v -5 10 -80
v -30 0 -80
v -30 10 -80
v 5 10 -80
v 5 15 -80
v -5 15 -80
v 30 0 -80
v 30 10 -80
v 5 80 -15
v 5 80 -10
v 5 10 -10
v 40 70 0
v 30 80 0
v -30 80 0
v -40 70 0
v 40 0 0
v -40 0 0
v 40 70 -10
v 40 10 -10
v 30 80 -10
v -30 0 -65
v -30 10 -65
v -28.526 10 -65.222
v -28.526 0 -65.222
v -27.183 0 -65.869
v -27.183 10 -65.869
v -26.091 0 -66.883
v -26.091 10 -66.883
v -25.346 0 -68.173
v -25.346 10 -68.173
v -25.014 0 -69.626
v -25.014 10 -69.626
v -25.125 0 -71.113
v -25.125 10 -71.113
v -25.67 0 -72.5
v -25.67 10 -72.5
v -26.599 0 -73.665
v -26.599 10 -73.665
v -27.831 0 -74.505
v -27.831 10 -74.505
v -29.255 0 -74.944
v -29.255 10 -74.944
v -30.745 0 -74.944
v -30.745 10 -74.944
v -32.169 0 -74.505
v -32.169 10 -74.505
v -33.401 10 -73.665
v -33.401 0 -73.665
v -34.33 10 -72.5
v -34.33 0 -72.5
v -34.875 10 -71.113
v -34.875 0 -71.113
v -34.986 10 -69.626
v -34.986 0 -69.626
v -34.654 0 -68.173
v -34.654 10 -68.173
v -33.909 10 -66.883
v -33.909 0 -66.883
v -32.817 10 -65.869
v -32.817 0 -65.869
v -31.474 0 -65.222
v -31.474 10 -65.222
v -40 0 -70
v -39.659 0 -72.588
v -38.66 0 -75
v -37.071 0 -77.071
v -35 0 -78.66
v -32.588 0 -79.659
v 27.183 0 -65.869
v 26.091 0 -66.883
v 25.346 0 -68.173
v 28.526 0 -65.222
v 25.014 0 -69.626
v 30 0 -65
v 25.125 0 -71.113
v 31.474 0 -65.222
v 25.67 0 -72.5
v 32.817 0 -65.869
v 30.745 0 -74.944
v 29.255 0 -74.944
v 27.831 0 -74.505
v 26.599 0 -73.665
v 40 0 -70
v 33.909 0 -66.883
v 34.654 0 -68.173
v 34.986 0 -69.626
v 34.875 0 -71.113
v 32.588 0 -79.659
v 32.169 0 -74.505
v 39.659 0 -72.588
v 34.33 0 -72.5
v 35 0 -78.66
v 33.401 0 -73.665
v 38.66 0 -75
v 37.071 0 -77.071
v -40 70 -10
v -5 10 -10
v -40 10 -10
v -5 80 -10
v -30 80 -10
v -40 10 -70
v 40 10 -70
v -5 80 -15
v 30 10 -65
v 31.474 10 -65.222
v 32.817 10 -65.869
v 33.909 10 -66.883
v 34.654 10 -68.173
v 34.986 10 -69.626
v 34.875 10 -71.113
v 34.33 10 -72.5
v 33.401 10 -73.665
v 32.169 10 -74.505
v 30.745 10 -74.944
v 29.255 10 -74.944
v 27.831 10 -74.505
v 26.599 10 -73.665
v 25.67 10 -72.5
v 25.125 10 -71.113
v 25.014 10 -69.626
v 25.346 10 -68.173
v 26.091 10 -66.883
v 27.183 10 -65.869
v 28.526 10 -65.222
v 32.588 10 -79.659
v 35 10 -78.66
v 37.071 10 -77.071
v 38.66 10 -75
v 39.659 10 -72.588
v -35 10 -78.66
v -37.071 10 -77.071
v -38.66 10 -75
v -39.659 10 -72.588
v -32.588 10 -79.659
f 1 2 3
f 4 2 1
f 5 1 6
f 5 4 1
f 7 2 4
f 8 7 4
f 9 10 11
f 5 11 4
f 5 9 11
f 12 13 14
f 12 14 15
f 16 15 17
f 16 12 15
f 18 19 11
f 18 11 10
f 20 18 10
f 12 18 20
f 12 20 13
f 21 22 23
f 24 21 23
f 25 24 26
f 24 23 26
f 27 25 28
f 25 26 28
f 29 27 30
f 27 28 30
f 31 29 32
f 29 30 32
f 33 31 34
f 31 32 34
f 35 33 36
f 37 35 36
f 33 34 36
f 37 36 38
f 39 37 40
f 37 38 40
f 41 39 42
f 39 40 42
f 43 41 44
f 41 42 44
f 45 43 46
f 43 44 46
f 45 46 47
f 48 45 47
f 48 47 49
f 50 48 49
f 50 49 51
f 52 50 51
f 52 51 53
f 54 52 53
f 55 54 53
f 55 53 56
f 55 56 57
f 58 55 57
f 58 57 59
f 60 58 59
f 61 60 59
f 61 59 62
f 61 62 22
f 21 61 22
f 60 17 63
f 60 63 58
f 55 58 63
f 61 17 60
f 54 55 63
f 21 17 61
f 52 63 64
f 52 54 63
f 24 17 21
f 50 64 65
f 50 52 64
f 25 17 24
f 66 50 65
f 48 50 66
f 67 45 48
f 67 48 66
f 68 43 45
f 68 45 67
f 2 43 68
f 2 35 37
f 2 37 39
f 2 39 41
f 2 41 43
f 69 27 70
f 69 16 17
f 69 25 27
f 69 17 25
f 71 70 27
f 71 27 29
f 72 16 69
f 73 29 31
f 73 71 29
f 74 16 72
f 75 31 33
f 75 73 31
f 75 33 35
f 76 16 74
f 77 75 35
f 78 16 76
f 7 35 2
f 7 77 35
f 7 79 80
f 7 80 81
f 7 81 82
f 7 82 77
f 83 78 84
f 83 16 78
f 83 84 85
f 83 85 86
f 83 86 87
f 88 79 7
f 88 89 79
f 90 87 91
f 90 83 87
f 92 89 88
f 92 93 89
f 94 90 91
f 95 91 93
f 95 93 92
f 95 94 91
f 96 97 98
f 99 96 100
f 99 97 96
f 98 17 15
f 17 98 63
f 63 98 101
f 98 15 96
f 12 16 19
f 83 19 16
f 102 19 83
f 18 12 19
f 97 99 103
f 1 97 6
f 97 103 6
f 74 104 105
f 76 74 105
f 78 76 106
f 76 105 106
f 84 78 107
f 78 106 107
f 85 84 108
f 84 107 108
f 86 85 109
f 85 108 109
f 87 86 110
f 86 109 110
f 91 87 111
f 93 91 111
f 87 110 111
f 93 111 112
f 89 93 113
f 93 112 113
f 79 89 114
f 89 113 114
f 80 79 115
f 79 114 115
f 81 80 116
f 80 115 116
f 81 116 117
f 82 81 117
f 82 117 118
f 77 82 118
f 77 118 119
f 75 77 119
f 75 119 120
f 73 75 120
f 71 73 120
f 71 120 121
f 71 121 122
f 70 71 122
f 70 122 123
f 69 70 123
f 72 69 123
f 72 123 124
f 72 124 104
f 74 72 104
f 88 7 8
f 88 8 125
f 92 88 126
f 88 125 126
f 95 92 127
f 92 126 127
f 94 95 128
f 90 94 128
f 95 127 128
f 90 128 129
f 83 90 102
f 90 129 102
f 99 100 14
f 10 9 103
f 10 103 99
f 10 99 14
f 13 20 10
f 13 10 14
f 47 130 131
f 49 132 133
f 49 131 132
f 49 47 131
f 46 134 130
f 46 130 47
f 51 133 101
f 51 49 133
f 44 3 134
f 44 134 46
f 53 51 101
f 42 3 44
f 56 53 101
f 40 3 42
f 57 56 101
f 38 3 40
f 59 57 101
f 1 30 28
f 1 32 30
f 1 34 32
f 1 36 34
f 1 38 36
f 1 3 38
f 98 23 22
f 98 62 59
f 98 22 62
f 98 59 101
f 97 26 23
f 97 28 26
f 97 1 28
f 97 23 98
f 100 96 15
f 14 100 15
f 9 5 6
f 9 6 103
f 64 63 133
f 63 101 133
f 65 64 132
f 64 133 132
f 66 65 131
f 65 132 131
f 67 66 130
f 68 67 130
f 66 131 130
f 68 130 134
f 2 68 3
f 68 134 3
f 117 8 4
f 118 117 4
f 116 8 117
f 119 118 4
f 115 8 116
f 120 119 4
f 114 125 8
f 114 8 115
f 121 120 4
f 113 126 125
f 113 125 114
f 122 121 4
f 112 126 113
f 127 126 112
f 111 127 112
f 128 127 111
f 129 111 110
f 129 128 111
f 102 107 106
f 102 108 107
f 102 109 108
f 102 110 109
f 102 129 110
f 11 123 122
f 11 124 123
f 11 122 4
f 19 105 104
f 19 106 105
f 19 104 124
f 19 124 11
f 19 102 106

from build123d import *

# Parameters (mm, degrees)
BOSS_EXTRUDE2_DEPTH = 40
BOSS_EXTRUDE3_DEPTH = 5
FILLET1_R           = 10
SKETCH3_R           = 5
CUT_EXTRUDE1_DEPTH  = 114.578166916
CHAMFER1_SIZE       = 10


with BuildPart() as part:
    # Sketch1 → Boss-Extrude2 (new, symmetric)
    with BuildSketch(Plane(origin=(0, 0, 0), x_dir=(0, 0, -1), z_dir=(1, 0, 0))):
        Polygon((0, 0), (80, 0), (80, 10), (10, 10), (10, 80), (0, 80), align=None)
    extrude(amount=BOSS_EXTRUDE2_DEPTH, both=True)

    # Sketch2 → Boss-Extrude3 (add, symmetric)
    with BuildSketch(Plane(origin=(0, 0, 0), x_dir=(0, 0, -1), z_dir=(1, 0, 0))):
        Polygon((10, 10), (80, 10), (80, 15), (15, 80), (10, 80), align=None)
    extrude(amount=BOSS_EXTRUDE3_DEPTH, both=True)

    # Fillet1
    fillet1_edges = [part.edges().sort_by_distance(p)[0] for p in [
        (40, 5, -80),
        (-40, 5, -80),
    ]]
    fillet(fillet1_edges, radius=FILLET1_R)

    # Sketch3 → Cut-Extrude1 (cut, through all)
    with BuildSketch(Plane(origin=(0, 10, 0), x_dir=(1, 0, 0), z_dir=(0, 1, 0))):
        with Locations(Location((30, 70, 0), (0, 0, 270))):
            Circle(SKETCH3_R)
        with Locations(Location((-30, 70, 0), (0, 0, 270))):
            Circle(SKETCH3_R)
    extrude(amount=-CUT_EXTRUDE1_DEPTH, mode=Mode.SUBTRACT)

    # Chamfer1
    chamfer1_edges = [part.edges().sort_by_distance(p)[0] for p in [
        (40, 80, -5),
        (-40, 80, -5),
    ]]
    chamfer(chamfer1_edges, length=CHAMFER1_SIZE)


solid = part.part
